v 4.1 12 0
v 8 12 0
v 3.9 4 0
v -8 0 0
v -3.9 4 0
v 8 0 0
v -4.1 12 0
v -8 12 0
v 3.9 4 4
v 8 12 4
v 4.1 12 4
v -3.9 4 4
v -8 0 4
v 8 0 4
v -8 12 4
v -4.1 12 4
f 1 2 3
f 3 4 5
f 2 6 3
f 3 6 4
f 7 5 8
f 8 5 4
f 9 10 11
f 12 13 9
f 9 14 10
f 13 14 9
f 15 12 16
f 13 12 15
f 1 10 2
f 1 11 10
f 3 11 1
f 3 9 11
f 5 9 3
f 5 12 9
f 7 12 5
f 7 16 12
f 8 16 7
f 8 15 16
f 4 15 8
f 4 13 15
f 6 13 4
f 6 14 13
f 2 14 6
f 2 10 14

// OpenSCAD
wW = 4;
wL = 3;
linear_extrude(4)
polygon( [
    [-0.975*wW,wW],[-1.025*wW,wL*wW],
    [-2*wW,wL*wW],[-2*wW,0],[2*wW,0],
    [2*wW,wL*wW],[1.025*wW,wL*wW],
    [0.975*wW,wW]]);
